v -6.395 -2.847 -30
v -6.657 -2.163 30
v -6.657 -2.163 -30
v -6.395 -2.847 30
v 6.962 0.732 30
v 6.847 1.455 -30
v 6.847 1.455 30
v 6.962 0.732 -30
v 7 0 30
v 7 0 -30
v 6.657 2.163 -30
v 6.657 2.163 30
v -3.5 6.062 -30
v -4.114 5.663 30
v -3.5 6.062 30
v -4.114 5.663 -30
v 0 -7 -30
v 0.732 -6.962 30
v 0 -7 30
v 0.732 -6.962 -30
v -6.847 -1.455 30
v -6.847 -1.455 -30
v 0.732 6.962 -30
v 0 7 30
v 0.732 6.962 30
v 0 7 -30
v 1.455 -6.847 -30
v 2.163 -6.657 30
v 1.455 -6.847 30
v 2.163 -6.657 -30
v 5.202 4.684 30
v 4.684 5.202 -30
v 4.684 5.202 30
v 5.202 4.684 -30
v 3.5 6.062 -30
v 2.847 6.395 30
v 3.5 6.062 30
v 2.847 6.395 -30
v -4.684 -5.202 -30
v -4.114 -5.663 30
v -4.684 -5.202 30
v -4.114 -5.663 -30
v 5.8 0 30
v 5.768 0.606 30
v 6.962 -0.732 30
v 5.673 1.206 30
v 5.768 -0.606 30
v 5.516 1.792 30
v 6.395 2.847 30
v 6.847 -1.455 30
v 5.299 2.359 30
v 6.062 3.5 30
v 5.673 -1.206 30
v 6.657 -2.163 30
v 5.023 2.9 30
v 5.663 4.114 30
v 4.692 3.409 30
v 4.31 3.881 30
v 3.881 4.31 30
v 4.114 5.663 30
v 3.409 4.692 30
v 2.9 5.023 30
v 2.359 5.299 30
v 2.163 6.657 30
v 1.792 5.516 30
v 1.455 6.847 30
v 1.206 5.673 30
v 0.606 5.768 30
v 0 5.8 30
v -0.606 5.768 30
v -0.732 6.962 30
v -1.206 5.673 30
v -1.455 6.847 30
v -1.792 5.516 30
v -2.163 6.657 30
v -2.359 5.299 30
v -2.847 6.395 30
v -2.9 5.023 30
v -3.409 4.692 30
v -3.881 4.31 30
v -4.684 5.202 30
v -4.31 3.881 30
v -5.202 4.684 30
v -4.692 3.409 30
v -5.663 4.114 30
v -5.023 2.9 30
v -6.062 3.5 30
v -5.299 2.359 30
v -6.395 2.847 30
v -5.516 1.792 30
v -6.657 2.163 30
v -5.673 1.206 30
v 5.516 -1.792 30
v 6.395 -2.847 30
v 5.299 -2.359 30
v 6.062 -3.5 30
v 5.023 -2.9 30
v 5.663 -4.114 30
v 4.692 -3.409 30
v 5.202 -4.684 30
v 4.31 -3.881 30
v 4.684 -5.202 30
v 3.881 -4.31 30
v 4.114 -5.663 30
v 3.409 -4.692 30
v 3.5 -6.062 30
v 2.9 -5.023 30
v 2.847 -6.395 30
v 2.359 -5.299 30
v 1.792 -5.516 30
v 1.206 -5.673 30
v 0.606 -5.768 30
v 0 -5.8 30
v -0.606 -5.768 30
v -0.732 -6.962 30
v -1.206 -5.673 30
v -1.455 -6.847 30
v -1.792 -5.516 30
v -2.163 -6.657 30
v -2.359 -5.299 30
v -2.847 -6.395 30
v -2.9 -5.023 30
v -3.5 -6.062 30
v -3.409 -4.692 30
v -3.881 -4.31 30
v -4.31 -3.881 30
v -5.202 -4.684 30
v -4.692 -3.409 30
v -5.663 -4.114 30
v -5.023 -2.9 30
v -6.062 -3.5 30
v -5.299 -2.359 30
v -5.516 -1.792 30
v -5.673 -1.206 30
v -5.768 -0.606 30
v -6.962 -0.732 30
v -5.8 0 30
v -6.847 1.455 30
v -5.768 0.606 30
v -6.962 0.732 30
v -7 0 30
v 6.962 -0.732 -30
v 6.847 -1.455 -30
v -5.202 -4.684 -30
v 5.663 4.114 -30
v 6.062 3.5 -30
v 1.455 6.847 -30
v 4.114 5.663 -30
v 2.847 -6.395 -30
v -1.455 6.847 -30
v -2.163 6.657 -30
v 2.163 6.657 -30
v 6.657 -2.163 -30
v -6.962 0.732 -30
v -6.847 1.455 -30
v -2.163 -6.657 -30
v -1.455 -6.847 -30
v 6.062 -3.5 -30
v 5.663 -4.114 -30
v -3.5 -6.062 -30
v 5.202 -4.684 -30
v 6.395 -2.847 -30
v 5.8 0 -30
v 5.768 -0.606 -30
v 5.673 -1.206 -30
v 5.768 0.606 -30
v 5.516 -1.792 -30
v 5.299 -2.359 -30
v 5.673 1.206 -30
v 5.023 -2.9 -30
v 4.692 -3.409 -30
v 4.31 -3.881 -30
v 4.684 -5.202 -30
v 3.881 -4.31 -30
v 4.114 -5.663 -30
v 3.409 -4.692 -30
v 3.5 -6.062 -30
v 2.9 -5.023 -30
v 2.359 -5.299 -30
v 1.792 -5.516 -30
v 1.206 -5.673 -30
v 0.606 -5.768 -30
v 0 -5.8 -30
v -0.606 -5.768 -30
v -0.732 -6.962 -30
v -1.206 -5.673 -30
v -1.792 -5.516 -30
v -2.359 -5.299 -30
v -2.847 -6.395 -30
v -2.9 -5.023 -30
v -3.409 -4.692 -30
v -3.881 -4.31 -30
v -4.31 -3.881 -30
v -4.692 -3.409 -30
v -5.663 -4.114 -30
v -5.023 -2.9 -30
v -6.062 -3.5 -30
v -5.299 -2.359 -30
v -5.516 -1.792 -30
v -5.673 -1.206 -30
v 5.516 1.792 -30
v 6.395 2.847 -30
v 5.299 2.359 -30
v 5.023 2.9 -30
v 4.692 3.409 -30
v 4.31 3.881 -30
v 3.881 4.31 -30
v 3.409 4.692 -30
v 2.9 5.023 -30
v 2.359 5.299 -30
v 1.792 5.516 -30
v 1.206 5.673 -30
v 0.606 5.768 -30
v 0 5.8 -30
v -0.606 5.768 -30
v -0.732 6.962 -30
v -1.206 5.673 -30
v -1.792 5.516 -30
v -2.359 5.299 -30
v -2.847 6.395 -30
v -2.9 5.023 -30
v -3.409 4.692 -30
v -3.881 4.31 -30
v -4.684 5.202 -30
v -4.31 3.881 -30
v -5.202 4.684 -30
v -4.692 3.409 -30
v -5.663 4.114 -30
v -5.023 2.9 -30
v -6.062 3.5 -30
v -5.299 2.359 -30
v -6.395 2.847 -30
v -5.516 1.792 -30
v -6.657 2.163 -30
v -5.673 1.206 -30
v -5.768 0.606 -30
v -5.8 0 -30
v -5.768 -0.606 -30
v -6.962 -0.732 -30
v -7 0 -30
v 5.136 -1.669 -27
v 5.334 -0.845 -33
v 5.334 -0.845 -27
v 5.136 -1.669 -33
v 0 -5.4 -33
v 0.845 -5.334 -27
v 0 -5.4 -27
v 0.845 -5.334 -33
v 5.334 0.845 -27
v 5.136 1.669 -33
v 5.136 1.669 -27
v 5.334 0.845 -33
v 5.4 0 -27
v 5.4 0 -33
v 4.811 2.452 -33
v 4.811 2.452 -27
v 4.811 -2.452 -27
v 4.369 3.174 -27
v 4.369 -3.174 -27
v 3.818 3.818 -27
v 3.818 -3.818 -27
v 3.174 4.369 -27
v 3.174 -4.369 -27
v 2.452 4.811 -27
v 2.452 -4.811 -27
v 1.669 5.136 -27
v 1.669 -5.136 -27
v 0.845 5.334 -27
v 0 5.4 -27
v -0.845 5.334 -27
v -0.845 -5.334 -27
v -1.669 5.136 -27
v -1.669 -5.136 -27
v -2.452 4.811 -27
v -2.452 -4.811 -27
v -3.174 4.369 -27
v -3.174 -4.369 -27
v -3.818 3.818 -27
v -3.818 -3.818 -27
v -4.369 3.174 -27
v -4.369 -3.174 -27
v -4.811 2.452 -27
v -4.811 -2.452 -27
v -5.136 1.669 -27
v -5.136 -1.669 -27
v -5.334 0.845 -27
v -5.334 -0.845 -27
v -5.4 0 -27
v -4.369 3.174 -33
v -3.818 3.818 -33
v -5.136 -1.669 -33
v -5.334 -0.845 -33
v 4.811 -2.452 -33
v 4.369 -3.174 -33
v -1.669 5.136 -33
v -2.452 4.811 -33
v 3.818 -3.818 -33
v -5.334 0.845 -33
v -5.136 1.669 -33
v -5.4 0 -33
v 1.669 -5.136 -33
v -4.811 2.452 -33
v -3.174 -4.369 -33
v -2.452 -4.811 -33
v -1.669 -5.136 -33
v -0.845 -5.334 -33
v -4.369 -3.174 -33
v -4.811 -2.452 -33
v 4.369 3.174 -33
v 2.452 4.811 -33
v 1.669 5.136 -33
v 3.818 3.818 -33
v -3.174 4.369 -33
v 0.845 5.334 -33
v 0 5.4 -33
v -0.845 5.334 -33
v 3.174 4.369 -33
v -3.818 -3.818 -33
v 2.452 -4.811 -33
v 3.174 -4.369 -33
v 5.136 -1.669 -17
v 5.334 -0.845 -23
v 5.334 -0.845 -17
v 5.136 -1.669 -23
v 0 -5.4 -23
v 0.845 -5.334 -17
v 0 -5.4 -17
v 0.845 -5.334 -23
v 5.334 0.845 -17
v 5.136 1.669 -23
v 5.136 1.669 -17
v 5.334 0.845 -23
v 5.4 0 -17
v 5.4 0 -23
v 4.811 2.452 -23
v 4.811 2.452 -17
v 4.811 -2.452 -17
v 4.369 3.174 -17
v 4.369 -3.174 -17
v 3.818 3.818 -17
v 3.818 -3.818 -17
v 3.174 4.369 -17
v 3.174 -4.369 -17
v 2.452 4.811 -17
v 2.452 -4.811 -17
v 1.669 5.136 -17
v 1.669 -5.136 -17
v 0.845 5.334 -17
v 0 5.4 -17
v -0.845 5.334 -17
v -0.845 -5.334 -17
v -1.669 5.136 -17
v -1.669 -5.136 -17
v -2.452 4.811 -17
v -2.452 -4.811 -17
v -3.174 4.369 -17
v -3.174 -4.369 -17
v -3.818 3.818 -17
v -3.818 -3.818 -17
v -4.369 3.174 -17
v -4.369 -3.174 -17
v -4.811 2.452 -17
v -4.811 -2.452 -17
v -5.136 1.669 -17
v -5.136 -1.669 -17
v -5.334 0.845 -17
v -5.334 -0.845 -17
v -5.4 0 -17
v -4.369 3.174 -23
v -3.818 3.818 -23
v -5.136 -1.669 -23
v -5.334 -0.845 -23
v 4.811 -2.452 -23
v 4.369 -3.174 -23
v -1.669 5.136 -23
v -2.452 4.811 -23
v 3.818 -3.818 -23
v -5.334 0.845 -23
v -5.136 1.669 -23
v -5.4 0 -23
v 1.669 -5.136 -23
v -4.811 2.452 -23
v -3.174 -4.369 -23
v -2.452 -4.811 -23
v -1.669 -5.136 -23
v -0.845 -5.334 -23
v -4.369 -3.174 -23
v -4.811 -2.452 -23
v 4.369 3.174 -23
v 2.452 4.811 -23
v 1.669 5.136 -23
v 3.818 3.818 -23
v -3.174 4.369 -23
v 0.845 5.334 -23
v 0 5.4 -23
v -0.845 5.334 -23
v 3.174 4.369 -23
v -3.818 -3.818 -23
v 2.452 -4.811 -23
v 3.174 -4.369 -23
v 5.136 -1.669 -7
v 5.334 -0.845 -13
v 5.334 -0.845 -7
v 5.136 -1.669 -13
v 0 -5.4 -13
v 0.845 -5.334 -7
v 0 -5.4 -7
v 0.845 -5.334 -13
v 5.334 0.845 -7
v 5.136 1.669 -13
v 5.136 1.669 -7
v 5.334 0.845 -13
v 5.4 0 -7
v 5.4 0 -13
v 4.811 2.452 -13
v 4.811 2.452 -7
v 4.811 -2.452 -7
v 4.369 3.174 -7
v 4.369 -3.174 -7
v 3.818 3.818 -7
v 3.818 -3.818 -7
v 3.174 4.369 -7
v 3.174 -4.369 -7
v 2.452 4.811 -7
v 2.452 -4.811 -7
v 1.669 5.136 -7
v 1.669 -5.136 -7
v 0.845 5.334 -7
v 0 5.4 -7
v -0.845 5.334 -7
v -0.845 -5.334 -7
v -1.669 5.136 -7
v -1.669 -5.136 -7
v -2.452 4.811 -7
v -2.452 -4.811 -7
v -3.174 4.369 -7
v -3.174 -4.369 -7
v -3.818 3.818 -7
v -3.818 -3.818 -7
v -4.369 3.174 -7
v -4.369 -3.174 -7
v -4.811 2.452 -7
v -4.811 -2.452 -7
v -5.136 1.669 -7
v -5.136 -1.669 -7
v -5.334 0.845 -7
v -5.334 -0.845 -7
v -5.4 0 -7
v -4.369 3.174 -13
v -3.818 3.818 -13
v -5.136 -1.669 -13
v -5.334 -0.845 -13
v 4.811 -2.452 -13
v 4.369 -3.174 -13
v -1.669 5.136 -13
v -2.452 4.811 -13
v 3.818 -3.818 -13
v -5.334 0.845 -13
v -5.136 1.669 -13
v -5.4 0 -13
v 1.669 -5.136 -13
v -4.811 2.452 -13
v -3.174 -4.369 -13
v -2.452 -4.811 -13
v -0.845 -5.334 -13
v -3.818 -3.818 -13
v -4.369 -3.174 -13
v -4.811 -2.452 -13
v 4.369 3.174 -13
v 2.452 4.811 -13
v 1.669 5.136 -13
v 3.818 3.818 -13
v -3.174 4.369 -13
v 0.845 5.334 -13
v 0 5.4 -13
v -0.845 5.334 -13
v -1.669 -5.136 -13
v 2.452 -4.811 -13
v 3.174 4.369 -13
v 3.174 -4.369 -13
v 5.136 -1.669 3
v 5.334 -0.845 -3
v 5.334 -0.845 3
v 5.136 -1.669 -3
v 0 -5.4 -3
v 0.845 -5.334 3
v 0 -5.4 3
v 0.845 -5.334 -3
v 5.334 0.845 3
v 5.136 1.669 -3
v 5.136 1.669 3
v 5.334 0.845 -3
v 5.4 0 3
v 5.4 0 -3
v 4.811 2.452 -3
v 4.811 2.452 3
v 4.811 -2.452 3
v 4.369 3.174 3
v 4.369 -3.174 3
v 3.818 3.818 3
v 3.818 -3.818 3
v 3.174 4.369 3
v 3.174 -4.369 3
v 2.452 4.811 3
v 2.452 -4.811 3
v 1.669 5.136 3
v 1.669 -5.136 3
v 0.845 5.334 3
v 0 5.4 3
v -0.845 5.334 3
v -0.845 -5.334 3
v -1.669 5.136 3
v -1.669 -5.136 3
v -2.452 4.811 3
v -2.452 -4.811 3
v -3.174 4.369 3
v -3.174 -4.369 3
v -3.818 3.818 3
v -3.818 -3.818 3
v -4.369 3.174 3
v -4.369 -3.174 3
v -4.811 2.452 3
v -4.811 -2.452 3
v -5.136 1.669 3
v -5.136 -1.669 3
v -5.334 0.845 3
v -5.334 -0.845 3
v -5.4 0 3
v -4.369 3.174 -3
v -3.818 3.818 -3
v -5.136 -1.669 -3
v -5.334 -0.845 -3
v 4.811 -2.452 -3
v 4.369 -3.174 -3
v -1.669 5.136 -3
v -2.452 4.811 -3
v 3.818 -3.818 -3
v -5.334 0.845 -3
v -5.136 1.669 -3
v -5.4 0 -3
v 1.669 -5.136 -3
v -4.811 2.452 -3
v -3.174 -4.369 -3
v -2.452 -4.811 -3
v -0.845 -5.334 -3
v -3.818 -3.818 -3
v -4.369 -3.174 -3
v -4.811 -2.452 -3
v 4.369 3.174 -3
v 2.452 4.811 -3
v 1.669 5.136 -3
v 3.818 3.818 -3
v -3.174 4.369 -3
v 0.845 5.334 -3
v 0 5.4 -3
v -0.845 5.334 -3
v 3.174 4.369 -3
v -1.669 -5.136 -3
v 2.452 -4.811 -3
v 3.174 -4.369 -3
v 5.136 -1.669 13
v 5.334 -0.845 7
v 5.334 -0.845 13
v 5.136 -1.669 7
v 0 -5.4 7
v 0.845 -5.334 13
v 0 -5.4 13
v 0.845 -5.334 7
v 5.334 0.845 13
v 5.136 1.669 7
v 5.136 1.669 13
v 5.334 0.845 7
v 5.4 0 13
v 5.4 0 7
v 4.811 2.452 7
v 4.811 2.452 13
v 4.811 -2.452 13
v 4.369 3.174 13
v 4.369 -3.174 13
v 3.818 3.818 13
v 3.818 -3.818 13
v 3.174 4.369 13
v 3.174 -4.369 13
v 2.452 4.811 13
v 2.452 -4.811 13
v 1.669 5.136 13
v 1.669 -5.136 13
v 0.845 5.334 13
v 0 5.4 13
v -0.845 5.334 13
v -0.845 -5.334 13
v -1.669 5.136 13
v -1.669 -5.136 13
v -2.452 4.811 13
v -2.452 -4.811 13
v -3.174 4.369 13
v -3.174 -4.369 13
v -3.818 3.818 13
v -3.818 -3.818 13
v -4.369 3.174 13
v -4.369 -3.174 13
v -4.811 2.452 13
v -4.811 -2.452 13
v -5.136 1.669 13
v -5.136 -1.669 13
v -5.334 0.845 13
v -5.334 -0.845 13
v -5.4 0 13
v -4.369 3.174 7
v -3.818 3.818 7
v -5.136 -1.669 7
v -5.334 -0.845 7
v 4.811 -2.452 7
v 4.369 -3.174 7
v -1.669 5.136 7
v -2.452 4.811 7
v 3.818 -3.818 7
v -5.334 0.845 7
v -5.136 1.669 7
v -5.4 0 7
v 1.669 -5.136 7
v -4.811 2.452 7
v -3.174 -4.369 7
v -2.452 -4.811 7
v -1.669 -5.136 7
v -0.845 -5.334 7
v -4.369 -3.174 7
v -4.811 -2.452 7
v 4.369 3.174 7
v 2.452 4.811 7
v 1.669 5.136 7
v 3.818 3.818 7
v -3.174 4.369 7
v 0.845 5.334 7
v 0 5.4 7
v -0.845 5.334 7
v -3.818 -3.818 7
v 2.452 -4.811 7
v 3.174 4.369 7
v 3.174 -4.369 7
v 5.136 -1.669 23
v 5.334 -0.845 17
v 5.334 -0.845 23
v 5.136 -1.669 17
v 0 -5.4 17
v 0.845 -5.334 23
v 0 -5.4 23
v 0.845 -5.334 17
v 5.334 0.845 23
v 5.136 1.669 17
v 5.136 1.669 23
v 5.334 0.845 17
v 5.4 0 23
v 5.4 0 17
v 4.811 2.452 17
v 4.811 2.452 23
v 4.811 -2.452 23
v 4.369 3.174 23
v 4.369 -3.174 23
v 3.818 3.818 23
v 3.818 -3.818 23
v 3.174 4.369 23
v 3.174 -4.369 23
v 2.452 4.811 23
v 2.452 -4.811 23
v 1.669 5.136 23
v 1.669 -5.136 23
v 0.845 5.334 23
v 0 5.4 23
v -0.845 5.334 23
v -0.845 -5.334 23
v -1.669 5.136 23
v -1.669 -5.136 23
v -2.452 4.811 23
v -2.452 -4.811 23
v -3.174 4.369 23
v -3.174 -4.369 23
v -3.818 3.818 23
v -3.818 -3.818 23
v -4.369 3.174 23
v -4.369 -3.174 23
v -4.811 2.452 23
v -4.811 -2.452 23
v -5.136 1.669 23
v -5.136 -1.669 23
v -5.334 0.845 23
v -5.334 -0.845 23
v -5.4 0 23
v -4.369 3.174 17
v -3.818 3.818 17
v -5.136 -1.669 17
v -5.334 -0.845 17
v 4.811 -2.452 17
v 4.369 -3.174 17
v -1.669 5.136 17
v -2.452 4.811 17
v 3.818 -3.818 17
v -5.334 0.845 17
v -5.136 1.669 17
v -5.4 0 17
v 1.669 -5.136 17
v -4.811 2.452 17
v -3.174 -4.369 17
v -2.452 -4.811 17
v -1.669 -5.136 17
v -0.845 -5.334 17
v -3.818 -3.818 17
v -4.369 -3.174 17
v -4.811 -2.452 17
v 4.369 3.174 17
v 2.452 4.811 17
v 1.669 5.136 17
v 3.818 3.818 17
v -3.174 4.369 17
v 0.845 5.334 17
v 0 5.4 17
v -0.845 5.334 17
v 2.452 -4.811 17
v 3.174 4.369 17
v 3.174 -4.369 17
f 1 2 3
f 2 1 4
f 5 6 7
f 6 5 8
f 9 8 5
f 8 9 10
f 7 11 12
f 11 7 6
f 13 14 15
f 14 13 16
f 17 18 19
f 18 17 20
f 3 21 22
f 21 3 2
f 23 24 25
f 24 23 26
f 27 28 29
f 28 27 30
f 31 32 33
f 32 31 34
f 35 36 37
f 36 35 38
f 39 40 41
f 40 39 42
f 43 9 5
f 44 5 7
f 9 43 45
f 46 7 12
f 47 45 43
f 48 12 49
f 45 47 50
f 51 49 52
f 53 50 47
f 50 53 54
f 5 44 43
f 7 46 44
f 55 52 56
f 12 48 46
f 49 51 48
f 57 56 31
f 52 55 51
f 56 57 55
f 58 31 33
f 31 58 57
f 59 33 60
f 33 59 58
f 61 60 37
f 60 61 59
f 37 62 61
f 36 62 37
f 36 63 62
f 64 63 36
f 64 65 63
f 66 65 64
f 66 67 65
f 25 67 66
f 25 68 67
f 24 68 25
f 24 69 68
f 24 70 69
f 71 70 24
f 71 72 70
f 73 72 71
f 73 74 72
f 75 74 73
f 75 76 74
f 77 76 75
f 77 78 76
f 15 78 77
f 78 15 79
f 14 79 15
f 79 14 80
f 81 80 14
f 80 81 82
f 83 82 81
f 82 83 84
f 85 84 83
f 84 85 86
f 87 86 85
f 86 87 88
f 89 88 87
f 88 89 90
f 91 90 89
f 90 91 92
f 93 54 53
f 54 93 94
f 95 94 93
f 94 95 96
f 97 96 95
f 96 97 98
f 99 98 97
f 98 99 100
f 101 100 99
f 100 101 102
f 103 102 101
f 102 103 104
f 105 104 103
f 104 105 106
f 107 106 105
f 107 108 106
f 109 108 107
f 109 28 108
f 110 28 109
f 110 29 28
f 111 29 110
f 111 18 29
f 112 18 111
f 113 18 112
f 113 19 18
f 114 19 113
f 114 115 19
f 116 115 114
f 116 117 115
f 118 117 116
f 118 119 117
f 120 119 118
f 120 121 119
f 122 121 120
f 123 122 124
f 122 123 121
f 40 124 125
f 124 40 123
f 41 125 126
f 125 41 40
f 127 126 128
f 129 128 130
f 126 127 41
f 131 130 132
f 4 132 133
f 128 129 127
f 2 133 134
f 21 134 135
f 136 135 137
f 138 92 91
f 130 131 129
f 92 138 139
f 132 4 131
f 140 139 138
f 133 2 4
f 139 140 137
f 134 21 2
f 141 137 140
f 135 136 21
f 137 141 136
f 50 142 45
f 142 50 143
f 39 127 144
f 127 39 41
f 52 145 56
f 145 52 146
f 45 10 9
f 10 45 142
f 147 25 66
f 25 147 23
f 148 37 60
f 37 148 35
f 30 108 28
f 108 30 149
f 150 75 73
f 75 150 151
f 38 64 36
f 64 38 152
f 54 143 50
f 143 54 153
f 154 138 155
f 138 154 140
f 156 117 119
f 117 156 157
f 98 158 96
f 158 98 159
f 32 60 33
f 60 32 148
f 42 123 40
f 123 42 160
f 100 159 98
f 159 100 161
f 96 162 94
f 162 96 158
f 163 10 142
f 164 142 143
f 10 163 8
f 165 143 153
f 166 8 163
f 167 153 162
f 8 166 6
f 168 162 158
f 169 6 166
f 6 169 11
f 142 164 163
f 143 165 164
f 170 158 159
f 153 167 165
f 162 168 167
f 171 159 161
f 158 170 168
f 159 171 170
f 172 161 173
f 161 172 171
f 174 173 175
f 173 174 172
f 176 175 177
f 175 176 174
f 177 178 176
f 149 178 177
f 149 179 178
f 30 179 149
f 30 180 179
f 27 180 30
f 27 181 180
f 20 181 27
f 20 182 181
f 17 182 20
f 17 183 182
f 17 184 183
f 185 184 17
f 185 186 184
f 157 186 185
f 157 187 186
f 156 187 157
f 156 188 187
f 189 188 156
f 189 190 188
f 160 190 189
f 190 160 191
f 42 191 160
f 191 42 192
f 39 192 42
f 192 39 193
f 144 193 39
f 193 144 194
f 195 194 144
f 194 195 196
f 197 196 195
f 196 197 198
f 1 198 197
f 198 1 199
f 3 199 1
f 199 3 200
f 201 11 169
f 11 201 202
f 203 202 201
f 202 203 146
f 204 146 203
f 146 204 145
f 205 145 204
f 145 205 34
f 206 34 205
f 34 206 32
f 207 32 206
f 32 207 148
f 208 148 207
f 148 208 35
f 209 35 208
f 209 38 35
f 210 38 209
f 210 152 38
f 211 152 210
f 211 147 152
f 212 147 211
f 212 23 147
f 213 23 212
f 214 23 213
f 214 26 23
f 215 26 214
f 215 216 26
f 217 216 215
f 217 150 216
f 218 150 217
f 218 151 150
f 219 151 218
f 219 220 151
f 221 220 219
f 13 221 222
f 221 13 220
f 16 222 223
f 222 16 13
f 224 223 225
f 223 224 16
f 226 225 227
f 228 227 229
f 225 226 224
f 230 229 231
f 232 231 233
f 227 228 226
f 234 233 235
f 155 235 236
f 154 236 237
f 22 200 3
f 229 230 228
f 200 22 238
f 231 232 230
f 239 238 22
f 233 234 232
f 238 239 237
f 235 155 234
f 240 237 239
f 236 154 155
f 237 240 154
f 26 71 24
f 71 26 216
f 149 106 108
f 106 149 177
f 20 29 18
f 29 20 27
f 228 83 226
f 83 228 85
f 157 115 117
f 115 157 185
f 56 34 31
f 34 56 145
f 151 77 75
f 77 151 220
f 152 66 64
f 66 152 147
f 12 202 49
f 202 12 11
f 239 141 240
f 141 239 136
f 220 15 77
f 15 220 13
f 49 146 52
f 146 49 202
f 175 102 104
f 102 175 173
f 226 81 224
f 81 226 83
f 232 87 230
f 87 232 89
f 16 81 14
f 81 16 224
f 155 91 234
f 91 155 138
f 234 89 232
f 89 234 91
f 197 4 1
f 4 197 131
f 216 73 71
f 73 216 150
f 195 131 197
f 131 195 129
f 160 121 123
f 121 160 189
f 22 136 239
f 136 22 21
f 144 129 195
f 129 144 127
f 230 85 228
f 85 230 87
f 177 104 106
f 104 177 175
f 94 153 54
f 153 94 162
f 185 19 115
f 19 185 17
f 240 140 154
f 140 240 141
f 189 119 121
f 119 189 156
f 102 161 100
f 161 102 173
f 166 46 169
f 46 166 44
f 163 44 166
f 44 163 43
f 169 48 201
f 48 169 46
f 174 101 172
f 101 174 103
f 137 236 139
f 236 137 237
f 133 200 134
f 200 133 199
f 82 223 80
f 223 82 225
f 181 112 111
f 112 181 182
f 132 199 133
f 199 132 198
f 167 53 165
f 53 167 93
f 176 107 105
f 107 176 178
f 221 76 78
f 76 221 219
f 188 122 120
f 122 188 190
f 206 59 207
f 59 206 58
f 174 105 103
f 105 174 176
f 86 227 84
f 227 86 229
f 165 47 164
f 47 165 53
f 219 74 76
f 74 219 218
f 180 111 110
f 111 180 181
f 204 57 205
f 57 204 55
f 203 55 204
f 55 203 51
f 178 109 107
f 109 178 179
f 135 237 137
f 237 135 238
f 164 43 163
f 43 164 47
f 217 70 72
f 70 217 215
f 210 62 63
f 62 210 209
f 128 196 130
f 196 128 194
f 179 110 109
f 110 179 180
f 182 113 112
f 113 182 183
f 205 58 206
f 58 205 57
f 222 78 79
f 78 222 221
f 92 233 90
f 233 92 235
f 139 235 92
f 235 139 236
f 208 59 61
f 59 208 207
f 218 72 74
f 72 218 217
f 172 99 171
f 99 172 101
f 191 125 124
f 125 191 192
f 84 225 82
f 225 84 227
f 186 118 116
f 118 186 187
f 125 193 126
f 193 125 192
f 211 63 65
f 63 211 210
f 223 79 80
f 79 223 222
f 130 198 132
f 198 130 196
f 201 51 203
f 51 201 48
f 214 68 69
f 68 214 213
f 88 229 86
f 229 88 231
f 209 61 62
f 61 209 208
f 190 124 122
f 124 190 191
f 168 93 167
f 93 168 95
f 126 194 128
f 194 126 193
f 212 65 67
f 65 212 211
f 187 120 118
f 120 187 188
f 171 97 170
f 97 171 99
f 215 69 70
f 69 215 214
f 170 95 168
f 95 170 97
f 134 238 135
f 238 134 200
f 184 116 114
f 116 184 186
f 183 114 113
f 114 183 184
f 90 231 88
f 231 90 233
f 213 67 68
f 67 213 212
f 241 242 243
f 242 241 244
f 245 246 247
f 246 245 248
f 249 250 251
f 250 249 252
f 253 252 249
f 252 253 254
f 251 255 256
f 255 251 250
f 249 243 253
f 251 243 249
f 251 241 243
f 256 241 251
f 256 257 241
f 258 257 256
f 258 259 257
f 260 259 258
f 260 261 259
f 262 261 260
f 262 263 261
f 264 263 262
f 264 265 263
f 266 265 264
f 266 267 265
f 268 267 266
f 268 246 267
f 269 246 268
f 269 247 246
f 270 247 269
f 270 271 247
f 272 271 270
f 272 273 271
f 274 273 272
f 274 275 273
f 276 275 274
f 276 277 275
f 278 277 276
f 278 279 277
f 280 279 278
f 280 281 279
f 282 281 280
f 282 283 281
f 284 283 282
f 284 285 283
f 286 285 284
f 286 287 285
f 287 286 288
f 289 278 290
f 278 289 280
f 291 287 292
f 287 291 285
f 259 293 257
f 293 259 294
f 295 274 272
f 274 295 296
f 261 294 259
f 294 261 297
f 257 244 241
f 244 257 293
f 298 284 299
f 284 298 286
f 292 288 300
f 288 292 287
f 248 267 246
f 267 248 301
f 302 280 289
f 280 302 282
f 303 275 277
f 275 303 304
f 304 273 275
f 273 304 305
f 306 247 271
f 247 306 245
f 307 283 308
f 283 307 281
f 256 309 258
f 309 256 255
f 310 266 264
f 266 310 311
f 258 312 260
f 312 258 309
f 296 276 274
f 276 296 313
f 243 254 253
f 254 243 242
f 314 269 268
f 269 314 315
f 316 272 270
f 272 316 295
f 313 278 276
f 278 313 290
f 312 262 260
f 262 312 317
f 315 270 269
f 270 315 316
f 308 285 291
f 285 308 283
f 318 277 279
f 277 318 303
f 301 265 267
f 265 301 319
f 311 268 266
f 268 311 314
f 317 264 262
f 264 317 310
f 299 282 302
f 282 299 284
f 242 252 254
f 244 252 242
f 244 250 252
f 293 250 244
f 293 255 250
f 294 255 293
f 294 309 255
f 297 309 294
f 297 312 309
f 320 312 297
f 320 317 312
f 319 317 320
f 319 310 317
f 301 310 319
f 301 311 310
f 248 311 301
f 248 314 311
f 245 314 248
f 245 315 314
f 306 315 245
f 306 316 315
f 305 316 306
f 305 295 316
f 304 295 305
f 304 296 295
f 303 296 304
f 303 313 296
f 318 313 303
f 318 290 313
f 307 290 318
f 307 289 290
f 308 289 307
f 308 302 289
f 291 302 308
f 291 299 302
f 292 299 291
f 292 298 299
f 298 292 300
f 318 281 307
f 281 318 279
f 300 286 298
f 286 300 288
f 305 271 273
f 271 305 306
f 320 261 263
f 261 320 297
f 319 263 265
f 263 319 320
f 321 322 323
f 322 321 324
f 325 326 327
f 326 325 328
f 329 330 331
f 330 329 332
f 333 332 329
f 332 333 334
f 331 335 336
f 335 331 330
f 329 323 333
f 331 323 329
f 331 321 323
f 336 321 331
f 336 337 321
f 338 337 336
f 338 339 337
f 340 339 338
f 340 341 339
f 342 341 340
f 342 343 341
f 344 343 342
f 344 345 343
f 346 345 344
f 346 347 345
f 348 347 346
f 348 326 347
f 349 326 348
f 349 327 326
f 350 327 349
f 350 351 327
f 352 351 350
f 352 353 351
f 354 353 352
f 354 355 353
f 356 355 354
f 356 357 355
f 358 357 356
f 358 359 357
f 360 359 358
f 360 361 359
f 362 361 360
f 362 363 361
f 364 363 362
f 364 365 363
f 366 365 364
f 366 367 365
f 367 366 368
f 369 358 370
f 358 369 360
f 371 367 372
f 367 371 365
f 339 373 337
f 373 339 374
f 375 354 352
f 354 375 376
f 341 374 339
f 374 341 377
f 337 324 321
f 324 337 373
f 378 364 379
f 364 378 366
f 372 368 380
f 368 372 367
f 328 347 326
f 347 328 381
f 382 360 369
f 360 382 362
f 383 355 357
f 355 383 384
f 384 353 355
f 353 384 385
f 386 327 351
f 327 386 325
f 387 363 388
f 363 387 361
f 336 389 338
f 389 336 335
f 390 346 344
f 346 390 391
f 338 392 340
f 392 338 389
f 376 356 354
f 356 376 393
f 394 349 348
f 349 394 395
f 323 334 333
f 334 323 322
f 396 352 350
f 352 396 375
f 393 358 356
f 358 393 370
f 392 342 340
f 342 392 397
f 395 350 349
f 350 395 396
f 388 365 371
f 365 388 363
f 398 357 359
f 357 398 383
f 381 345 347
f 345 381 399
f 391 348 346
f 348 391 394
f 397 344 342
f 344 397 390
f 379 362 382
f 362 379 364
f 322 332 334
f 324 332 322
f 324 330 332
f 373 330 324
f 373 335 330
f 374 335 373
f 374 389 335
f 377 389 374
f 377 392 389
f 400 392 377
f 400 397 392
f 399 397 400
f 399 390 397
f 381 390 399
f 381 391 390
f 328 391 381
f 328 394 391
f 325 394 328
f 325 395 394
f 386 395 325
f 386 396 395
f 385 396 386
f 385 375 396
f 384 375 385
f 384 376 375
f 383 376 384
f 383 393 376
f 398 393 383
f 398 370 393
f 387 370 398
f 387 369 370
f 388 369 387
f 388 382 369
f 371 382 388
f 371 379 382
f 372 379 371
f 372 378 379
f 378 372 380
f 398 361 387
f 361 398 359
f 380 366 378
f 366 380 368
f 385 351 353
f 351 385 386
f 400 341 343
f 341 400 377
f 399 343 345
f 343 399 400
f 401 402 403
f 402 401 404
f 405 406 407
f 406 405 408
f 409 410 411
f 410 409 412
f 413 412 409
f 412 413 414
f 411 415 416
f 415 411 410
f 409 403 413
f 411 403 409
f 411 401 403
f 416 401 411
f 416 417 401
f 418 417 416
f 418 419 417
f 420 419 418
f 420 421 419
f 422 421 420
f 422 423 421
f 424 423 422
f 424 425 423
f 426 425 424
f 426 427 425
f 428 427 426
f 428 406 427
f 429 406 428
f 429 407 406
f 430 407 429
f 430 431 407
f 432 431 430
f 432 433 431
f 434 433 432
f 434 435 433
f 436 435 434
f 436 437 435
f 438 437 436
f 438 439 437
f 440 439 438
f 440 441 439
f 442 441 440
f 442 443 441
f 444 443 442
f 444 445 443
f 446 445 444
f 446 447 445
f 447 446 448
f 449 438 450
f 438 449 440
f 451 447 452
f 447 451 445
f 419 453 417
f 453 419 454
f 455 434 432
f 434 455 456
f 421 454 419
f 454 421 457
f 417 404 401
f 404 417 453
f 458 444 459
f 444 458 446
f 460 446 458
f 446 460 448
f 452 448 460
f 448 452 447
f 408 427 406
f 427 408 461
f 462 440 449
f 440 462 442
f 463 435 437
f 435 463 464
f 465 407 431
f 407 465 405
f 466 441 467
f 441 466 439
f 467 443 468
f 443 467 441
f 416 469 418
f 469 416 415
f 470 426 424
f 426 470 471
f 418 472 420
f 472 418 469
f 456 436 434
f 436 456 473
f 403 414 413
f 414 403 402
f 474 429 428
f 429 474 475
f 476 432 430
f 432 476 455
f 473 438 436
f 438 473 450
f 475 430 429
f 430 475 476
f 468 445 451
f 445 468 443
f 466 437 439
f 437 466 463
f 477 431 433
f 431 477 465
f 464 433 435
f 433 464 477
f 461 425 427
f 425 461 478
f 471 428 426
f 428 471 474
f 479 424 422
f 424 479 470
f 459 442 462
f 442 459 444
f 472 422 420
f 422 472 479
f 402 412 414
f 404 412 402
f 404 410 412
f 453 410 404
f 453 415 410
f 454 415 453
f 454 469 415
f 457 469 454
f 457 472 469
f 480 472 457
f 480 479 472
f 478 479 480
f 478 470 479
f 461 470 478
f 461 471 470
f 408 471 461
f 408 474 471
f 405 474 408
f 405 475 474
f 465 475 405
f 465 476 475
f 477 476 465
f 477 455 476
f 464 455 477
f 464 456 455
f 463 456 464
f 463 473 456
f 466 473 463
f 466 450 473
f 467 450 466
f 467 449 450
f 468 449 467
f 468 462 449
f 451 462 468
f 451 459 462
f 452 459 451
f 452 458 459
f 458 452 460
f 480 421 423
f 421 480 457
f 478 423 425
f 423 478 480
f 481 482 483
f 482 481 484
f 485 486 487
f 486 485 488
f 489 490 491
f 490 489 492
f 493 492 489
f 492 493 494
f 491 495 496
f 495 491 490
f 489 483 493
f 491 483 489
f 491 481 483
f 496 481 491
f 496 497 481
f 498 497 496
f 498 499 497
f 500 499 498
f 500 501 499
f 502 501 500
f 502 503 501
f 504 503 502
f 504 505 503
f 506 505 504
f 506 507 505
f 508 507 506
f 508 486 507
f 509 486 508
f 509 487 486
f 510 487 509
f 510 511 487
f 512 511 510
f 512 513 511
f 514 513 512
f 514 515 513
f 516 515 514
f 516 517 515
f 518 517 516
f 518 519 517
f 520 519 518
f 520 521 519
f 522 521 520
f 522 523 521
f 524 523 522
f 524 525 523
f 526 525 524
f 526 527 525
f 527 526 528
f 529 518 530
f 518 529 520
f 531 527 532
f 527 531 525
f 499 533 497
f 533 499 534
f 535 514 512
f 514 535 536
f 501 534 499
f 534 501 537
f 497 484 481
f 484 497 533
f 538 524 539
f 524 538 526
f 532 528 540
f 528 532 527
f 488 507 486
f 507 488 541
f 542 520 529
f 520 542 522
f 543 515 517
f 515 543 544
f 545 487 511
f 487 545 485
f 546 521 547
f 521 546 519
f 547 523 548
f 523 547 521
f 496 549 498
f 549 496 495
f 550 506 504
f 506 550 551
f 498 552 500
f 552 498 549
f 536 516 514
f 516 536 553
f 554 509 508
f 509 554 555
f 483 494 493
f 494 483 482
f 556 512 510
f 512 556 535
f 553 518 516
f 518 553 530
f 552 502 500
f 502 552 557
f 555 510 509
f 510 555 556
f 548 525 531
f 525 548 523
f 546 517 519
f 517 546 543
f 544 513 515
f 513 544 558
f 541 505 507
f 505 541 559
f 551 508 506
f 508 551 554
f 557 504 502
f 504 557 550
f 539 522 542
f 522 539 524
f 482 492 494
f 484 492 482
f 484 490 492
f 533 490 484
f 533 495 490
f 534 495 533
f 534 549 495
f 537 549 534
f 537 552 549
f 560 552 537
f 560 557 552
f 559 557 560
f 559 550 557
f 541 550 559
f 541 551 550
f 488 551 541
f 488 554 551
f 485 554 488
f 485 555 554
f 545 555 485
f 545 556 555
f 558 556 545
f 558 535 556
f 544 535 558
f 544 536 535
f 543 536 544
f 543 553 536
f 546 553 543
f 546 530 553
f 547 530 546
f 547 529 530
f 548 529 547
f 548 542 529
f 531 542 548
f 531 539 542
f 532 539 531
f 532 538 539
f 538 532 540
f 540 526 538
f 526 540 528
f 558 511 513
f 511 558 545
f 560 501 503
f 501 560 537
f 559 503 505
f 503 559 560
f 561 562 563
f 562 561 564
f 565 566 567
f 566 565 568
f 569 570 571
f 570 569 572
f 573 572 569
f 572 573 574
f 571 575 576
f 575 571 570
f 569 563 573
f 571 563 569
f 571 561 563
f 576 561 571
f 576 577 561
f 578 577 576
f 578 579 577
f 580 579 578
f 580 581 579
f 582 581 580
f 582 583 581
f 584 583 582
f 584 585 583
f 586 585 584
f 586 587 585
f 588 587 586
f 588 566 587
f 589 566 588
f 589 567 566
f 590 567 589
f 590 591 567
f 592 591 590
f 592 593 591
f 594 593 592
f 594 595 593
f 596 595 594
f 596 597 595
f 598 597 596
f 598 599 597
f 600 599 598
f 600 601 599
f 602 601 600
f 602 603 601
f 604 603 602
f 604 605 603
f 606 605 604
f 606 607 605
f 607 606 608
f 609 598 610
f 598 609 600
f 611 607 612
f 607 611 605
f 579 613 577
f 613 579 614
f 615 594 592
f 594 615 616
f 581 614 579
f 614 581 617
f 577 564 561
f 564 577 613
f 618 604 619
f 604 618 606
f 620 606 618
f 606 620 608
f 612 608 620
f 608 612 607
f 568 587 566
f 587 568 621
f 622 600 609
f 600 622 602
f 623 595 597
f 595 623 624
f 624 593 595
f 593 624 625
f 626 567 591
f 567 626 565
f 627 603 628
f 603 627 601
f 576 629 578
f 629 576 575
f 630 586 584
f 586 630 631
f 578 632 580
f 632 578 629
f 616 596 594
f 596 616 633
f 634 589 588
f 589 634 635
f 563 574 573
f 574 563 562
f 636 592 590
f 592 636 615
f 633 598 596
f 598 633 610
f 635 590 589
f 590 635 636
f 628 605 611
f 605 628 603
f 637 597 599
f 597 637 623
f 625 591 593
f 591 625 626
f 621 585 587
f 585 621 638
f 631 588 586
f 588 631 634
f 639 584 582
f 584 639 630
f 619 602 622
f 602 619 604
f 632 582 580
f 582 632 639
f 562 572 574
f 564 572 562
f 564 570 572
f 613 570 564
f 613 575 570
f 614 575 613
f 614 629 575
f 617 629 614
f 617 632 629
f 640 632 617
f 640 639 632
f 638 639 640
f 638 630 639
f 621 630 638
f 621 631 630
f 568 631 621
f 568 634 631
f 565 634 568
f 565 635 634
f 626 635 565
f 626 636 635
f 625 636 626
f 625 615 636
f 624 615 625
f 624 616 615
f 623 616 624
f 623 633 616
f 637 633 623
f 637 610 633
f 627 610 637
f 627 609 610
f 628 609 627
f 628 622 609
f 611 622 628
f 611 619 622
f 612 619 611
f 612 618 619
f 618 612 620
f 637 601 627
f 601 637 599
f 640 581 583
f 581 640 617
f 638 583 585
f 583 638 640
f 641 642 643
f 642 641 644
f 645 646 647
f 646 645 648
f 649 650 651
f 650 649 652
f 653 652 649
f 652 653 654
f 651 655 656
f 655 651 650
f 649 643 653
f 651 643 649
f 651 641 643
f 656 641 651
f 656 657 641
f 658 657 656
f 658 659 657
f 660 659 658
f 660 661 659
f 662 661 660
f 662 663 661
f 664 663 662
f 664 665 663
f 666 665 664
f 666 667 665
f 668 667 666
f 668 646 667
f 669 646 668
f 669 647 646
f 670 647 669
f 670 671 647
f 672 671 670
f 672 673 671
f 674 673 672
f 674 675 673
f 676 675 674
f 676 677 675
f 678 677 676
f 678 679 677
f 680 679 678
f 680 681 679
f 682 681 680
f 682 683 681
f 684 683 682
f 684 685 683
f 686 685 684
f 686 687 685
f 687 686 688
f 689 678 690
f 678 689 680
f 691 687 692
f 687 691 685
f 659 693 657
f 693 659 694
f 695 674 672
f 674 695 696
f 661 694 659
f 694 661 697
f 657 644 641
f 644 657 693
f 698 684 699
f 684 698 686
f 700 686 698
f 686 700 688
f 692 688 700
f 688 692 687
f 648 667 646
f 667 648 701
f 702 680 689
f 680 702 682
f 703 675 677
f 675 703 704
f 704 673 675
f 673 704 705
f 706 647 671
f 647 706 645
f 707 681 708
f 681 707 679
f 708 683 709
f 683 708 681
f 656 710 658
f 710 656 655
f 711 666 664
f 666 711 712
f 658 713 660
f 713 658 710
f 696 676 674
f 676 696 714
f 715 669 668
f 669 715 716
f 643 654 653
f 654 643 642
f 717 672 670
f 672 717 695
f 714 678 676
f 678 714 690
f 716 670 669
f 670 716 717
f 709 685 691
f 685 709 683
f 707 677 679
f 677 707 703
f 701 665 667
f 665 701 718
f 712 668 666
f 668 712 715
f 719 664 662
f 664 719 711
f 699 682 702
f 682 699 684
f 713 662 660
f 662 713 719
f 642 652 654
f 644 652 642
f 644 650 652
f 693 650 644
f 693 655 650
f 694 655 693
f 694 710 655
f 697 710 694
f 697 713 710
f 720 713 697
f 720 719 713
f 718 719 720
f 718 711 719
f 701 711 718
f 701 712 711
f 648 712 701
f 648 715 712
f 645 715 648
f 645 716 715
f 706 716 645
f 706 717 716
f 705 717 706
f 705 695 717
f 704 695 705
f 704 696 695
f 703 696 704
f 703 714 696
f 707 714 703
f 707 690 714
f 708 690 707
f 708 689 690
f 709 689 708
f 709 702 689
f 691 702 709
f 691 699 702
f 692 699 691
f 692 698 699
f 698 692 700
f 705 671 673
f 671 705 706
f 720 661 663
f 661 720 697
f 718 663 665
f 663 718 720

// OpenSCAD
// ==========================================
// Linear & Discrete Fluid Flow Simulation
// Author: Your Name
// ==========================================
// To view animation: View > Animate 
// Recommended Settings: Steps: 24, FPS: 12

// Parameters
pipe_length = 60;
pipe_radius = 7;
wall_thickness = 1.2;
num_slugs = 6;         
total_steps = 24;      

// Quantized time variable
discrete_t = floor($t * total_steps) / total_steps;

// Render a hollow, transparent pipe
module pipe() {
    color("SlateGray", 0.25)
    render()
    difference() {
        cylinder(r = pipe_radius, h = pipe_length, center = true, $fn = 60);
        cylinder(r = pipe_radius - wall_thickness, h = pipe_length + 2, center = true, $fn = 60);
    }
}

// Render discrete fluid slugs
module discrete_fluid() {
    spacing = pipe_length / num_slugs;
    
    for (i = [0 : num_slugs - 1]) {
        offset = ((i * spacing + (discrete_t * pipe_length)) % pipe_length) - (pipe_length / 2);
        
        // Dynamic color shifting based on position for a sleek tech look
        hue_shift = (i / num_slugs);
        
        translate([0, 0, offset])
            color("DeepSkyBlue", 0.95)
            cylinder(r = pipe_radius - wall_thickness - 0.4, h = spacing * 0.6, center = true, $fn = 40);
    }
}

// Assemble scene
pipe();
discrete_fluid();
